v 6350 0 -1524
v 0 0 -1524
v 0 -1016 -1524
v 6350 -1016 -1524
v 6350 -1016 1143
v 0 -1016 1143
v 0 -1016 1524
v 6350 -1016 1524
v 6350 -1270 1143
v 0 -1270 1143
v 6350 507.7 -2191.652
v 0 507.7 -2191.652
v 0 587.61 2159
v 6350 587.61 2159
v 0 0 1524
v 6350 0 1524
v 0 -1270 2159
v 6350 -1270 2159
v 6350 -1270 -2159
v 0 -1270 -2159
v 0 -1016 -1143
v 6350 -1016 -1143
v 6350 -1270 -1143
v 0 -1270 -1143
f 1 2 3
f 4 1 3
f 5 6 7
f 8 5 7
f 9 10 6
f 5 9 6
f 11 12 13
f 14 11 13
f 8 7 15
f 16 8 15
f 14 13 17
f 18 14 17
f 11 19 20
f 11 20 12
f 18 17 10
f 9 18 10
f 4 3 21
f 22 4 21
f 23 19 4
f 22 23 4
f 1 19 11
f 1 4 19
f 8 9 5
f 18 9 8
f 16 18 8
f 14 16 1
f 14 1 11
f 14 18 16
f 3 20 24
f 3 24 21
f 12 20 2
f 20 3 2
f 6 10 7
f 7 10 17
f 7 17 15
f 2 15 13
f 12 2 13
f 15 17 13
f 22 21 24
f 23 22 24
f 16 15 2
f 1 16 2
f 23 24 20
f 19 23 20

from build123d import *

# Parameters (mm, degrees)
F1_DEPTH = 6350


with BuildPart() as f1:
    # F0 (on Right) → F1 (new body)
    with BuildSketch(Plane.YZ):
        Polygon((0, 1524), (0, 0), (0, -1524), (-1016, -1524), (-1016, -1143), (-1270, -1143), (-1270, -2159), (507.700164, -2191.651612), (587.610033, 2159), (-1270, 2159), (-1270, 1143), (-1016, 1143), (-1016, 1524), align=None)
    extrude(amount=F1_DEPTH)


solid = f1.part
